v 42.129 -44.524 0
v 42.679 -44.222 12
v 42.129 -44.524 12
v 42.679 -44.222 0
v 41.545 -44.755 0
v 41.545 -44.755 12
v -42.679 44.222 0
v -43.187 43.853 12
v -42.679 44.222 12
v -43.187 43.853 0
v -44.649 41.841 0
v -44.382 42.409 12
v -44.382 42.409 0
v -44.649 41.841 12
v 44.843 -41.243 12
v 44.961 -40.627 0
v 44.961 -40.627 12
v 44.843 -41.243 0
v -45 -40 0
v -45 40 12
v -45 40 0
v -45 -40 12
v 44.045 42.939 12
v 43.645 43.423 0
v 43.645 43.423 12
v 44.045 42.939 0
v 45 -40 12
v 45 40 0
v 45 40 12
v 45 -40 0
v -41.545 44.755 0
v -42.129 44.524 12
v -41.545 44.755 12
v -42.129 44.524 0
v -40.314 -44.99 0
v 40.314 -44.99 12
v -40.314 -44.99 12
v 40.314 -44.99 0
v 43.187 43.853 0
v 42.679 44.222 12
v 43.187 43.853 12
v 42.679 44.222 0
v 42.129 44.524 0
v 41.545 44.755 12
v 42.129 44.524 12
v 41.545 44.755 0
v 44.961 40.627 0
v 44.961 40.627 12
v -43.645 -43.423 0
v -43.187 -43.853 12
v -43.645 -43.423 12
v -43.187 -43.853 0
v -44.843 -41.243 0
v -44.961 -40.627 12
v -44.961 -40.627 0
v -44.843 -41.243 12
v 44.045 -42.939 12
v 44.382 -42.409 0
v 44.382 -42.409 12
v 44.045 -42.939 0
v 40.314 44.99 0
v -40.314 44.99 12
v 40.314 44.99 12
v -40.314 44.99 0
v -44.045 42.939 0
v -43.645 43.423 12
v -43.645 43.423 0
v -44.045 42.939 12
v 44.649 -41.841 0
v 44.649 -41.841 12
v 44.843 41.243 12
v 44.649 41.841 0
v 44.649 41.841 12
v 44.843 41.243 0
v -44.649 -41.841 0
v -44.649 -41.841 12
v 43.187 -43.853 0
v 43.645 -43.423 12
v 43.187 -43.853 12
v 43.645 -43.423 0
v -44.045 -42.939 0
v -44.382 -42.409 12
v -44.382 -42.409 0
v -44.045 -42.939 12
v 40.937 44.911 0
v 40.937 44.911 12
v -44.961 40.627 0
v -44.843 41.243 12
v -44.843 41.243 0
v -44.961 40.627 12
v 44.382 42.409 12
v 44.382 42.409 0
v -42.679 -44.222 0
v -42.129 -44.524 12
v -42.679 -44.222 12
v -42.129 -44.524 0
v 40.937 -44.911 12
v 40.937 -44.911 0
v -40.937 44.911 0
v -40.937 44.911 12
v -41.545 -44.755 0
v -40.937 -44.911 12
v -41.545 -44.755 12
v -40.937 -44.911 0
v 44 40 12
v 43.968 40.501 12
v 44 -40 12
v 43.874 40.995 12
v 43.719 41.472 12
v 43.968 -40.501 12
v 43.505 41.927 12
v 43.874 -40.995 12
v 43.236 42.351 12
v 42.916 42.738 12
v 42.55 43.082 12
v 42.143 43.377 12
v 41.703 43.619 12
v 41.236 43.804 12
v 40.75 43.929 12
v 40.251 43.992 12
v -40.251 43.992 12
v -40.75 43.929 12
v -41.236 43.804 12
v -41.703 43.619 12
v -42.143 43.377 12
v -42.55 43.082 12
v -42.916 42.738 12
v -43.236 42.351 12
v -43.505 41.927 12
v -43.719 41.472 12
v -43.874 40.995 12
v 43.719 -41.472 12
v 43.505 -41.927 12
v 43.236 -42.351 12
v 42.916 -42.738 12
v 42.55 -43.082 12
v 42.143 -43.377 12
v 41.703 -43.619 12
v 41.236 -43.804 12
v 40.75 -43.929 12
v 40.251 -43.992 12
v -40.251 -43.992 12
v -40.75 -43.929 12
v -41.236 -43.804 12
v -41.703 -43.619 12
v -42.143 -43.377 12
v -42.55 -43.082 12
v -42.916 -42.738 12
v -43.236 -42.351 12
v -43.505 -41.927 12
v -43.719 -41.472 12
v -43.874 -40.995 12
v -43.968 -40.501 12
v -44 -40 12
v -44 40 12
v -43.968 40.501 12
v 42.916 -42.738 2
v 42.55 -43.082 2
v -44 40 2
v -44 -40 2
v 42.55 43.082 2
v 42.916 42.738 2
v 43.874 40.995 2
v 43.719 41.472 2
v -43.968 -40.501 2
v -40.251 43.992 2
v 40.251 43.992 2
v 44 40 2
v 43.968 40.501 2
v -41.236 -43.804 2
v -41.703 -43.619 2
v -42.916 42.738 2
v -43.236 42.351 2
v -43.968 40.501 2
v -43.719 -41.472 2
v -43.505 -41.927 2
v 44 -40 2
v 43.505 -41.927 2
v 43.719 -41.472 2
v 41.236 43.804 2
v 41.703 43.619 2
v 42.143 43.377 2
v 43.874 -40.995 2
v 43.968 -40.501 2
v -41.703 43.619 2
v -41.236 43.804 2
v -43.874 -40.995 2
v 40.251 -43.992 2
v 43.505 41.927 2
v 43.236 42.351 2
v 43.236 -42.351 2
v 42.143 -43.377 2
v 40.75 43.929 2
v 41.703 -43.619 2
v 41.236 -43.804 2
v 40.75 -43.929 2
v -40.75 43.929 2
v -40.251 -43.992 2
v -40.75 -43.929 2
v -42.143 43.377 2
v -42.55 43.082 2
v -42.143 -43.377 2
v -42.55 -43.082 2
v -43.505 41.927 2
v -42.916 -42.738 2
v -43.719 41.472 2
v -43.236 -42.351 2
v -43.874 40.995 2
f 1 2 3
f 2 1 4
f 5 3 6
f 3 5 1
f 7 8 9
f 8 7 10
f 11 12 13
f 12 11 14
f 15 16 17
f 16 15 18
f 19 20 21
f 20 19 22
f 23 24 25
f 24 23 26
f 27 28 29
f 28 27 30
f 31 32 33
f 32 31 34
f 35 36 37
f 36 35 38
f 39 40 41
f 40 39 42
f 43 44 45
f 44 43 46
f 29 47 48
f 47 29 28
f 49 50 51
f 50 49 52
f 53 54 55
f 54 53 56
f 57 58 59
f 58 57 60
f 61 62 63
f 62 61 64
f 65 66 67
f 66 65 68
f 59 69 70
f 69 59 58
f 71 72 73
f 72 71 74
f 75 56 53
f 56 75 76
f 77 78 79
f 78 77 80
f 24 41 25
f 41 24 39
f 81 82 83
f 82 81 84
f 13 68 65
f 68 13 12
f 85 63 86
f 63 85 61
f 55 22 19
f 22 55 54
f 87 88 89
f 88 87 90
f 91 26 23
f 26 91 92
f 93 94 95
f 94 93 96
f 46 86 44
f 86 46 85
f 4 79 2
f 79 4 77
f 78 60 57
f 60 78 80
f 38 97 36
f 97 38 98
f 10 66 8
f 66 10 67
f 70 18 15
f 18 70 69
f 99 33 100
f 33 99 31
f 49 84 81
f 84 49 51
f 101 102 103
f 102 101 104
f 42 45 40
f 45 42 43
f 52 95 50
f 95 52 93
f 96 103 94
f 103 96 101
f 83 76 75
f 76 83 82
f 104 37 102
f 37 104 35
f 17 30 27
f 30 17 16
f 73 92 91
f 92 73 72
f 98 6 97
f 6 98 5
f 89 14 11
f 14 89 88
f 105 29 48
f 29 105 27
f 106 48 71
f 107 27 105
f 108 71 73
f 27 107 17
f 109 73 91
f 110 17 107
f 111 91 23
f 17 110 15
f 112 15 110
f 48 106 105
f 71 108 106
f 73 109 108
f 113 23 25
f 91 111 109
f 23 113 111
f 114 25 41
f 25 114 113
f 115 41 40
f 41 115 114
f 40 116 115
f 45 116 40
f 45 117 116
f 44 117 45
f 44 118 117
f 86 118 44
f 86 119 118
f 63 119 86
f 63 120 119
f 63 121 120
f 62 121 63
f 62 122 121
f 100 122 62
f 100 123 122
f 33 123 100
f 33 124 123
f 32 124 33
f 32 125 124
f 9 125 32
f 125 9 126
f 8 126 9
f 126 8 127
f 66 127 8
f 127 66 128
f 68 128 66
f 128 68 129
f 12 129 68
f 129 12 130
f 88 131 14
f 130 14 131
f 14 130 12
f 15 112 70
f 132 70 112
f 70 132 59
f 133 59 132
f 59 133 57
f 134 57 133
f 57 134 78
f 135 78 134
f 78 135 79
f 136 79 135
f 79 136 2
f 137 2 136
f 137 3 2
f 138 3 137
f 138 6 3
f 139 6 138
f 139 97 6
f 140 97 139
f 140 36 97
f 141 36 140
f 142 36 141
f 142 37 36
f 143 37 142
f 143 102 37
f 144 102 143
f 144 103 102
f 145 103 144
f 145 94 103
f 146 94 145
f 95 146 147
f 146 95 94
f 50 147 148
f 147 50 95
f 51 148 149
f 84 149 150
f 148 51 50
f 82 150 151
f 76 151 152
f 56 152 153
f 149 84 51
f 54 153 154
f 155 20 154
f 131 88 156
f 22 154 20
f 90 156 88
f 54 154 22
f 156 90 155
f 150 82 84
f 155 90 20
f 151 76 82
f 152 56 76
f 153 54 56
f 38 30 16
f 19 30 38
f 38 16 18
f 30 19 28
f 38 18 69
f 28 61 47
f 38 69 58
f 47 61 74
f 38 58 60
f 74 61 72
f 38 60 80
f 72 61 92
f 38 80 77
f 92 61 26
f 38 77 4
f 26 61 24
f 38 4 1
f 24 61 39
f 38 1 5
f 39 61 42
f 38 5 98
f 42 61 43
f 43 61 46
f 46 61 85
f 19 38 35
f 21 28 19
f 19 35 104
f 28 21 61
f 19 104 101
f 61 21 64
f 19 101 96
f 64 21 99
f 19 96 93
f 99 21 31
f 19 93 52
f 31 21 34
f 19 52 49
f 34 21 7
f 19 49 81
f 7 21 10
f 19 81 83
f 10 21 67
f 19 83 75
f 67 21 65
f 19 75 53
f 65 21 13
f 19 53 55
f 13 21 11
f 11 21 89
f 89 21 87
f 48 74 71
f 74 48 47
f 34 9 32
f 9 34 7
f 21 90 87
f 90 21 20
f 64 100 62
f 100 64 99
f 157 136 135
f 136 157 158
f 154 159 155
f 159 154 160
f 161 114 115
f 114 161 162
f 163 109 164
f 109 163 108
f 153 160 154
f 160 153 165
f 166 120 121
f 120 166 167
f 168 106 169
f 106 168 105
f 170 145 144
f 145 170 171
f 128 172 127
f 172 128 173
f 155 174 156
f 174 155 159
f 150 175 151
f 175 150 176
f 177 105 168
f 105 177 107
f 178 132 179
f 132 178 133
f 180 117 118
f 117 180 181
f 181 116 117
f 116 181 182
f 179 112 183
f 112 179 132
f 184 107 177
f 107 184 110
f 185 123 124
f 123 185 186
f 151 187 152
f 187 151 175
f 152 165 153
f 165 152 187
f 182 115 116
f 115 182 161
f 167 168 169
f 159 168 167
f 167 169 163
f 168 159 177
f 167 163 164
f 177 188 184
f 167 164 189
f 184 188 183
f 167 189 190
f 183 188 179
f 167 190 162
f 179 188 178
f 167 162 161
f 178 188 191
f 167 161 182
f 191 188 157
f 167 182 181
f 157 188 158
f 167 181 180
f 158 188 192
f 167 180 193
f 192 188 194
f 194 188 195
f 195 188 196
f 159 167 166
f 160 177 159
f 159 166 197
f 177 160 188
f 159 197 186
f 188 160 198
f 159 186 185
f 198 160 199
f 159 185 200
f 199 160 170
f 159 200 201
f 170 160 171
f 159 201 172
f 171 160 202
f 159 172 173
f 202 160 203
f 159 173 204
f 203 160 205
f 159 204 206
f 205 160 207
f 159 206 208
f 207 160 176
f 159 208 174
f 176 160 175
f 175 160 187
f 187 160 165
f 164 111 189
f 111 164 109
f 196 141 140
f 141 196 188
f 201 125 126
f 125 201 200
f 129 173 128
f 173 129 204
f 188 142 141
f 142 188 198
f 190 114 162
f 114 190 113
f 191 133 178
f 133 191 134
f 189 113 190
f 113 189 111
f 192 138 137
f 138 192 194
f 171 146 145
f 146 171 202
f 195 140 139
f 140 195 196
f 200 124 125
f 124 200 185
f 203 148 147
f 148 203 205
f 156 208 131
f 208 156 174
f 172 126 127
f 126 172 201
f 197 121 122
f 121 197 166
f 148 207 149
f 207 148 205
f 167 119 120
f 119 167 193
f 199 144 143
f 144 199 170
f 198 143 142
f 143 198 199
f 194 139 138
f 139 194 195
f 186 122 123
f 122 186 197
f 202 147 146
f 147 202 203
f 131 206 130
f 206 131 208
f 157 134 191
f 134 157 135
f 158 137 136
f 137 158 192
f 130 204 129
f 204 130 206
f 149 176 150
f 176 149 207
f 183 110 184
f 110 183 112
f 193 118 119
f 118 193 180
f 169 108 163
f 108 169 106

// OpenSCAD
$fn = 50;


difference() {
	union() {
		hull() {
			translate(v = [-40.0000000000, 40.0000000000, 0]) {
				cylinder(h = 12, r = 5);
			}
			translate(v = [40.0000000000, 40.0000000000, 0]) {
				cylinder(h = 12, r = 5);
			}
			translate(v = [-40.0000000000, -40.0000000000, 0]) {
				cylinder(h = 12, r = 5);
			}
			translate(v = [40.0000000000, -40.0000000000, 0]) {
				cylinder(h = 12, r = 5);
			}
		}
	}
	union() {
		translate(v = [0, 0, 2]) {
			hull() {
				translate(v = [-40.0000000000, 40.0000000000, 0]) {
					cylinder(h = 10, r = 4);
				}
				translate(v = [40.0000000000, 40.0000000000, 0]) {
					cylinder(h = 10, r = 4);
				}
				translate(v = [-40.0000000000, -40.0000000000, 0]) {
					cylinder(h = 10, r = 4);
				}
				translate(v = [40.0000000000, -40.0000000000, 0]) {
					cylinder(h = 10, r = 4);
				}
			}
		}
	}
}
